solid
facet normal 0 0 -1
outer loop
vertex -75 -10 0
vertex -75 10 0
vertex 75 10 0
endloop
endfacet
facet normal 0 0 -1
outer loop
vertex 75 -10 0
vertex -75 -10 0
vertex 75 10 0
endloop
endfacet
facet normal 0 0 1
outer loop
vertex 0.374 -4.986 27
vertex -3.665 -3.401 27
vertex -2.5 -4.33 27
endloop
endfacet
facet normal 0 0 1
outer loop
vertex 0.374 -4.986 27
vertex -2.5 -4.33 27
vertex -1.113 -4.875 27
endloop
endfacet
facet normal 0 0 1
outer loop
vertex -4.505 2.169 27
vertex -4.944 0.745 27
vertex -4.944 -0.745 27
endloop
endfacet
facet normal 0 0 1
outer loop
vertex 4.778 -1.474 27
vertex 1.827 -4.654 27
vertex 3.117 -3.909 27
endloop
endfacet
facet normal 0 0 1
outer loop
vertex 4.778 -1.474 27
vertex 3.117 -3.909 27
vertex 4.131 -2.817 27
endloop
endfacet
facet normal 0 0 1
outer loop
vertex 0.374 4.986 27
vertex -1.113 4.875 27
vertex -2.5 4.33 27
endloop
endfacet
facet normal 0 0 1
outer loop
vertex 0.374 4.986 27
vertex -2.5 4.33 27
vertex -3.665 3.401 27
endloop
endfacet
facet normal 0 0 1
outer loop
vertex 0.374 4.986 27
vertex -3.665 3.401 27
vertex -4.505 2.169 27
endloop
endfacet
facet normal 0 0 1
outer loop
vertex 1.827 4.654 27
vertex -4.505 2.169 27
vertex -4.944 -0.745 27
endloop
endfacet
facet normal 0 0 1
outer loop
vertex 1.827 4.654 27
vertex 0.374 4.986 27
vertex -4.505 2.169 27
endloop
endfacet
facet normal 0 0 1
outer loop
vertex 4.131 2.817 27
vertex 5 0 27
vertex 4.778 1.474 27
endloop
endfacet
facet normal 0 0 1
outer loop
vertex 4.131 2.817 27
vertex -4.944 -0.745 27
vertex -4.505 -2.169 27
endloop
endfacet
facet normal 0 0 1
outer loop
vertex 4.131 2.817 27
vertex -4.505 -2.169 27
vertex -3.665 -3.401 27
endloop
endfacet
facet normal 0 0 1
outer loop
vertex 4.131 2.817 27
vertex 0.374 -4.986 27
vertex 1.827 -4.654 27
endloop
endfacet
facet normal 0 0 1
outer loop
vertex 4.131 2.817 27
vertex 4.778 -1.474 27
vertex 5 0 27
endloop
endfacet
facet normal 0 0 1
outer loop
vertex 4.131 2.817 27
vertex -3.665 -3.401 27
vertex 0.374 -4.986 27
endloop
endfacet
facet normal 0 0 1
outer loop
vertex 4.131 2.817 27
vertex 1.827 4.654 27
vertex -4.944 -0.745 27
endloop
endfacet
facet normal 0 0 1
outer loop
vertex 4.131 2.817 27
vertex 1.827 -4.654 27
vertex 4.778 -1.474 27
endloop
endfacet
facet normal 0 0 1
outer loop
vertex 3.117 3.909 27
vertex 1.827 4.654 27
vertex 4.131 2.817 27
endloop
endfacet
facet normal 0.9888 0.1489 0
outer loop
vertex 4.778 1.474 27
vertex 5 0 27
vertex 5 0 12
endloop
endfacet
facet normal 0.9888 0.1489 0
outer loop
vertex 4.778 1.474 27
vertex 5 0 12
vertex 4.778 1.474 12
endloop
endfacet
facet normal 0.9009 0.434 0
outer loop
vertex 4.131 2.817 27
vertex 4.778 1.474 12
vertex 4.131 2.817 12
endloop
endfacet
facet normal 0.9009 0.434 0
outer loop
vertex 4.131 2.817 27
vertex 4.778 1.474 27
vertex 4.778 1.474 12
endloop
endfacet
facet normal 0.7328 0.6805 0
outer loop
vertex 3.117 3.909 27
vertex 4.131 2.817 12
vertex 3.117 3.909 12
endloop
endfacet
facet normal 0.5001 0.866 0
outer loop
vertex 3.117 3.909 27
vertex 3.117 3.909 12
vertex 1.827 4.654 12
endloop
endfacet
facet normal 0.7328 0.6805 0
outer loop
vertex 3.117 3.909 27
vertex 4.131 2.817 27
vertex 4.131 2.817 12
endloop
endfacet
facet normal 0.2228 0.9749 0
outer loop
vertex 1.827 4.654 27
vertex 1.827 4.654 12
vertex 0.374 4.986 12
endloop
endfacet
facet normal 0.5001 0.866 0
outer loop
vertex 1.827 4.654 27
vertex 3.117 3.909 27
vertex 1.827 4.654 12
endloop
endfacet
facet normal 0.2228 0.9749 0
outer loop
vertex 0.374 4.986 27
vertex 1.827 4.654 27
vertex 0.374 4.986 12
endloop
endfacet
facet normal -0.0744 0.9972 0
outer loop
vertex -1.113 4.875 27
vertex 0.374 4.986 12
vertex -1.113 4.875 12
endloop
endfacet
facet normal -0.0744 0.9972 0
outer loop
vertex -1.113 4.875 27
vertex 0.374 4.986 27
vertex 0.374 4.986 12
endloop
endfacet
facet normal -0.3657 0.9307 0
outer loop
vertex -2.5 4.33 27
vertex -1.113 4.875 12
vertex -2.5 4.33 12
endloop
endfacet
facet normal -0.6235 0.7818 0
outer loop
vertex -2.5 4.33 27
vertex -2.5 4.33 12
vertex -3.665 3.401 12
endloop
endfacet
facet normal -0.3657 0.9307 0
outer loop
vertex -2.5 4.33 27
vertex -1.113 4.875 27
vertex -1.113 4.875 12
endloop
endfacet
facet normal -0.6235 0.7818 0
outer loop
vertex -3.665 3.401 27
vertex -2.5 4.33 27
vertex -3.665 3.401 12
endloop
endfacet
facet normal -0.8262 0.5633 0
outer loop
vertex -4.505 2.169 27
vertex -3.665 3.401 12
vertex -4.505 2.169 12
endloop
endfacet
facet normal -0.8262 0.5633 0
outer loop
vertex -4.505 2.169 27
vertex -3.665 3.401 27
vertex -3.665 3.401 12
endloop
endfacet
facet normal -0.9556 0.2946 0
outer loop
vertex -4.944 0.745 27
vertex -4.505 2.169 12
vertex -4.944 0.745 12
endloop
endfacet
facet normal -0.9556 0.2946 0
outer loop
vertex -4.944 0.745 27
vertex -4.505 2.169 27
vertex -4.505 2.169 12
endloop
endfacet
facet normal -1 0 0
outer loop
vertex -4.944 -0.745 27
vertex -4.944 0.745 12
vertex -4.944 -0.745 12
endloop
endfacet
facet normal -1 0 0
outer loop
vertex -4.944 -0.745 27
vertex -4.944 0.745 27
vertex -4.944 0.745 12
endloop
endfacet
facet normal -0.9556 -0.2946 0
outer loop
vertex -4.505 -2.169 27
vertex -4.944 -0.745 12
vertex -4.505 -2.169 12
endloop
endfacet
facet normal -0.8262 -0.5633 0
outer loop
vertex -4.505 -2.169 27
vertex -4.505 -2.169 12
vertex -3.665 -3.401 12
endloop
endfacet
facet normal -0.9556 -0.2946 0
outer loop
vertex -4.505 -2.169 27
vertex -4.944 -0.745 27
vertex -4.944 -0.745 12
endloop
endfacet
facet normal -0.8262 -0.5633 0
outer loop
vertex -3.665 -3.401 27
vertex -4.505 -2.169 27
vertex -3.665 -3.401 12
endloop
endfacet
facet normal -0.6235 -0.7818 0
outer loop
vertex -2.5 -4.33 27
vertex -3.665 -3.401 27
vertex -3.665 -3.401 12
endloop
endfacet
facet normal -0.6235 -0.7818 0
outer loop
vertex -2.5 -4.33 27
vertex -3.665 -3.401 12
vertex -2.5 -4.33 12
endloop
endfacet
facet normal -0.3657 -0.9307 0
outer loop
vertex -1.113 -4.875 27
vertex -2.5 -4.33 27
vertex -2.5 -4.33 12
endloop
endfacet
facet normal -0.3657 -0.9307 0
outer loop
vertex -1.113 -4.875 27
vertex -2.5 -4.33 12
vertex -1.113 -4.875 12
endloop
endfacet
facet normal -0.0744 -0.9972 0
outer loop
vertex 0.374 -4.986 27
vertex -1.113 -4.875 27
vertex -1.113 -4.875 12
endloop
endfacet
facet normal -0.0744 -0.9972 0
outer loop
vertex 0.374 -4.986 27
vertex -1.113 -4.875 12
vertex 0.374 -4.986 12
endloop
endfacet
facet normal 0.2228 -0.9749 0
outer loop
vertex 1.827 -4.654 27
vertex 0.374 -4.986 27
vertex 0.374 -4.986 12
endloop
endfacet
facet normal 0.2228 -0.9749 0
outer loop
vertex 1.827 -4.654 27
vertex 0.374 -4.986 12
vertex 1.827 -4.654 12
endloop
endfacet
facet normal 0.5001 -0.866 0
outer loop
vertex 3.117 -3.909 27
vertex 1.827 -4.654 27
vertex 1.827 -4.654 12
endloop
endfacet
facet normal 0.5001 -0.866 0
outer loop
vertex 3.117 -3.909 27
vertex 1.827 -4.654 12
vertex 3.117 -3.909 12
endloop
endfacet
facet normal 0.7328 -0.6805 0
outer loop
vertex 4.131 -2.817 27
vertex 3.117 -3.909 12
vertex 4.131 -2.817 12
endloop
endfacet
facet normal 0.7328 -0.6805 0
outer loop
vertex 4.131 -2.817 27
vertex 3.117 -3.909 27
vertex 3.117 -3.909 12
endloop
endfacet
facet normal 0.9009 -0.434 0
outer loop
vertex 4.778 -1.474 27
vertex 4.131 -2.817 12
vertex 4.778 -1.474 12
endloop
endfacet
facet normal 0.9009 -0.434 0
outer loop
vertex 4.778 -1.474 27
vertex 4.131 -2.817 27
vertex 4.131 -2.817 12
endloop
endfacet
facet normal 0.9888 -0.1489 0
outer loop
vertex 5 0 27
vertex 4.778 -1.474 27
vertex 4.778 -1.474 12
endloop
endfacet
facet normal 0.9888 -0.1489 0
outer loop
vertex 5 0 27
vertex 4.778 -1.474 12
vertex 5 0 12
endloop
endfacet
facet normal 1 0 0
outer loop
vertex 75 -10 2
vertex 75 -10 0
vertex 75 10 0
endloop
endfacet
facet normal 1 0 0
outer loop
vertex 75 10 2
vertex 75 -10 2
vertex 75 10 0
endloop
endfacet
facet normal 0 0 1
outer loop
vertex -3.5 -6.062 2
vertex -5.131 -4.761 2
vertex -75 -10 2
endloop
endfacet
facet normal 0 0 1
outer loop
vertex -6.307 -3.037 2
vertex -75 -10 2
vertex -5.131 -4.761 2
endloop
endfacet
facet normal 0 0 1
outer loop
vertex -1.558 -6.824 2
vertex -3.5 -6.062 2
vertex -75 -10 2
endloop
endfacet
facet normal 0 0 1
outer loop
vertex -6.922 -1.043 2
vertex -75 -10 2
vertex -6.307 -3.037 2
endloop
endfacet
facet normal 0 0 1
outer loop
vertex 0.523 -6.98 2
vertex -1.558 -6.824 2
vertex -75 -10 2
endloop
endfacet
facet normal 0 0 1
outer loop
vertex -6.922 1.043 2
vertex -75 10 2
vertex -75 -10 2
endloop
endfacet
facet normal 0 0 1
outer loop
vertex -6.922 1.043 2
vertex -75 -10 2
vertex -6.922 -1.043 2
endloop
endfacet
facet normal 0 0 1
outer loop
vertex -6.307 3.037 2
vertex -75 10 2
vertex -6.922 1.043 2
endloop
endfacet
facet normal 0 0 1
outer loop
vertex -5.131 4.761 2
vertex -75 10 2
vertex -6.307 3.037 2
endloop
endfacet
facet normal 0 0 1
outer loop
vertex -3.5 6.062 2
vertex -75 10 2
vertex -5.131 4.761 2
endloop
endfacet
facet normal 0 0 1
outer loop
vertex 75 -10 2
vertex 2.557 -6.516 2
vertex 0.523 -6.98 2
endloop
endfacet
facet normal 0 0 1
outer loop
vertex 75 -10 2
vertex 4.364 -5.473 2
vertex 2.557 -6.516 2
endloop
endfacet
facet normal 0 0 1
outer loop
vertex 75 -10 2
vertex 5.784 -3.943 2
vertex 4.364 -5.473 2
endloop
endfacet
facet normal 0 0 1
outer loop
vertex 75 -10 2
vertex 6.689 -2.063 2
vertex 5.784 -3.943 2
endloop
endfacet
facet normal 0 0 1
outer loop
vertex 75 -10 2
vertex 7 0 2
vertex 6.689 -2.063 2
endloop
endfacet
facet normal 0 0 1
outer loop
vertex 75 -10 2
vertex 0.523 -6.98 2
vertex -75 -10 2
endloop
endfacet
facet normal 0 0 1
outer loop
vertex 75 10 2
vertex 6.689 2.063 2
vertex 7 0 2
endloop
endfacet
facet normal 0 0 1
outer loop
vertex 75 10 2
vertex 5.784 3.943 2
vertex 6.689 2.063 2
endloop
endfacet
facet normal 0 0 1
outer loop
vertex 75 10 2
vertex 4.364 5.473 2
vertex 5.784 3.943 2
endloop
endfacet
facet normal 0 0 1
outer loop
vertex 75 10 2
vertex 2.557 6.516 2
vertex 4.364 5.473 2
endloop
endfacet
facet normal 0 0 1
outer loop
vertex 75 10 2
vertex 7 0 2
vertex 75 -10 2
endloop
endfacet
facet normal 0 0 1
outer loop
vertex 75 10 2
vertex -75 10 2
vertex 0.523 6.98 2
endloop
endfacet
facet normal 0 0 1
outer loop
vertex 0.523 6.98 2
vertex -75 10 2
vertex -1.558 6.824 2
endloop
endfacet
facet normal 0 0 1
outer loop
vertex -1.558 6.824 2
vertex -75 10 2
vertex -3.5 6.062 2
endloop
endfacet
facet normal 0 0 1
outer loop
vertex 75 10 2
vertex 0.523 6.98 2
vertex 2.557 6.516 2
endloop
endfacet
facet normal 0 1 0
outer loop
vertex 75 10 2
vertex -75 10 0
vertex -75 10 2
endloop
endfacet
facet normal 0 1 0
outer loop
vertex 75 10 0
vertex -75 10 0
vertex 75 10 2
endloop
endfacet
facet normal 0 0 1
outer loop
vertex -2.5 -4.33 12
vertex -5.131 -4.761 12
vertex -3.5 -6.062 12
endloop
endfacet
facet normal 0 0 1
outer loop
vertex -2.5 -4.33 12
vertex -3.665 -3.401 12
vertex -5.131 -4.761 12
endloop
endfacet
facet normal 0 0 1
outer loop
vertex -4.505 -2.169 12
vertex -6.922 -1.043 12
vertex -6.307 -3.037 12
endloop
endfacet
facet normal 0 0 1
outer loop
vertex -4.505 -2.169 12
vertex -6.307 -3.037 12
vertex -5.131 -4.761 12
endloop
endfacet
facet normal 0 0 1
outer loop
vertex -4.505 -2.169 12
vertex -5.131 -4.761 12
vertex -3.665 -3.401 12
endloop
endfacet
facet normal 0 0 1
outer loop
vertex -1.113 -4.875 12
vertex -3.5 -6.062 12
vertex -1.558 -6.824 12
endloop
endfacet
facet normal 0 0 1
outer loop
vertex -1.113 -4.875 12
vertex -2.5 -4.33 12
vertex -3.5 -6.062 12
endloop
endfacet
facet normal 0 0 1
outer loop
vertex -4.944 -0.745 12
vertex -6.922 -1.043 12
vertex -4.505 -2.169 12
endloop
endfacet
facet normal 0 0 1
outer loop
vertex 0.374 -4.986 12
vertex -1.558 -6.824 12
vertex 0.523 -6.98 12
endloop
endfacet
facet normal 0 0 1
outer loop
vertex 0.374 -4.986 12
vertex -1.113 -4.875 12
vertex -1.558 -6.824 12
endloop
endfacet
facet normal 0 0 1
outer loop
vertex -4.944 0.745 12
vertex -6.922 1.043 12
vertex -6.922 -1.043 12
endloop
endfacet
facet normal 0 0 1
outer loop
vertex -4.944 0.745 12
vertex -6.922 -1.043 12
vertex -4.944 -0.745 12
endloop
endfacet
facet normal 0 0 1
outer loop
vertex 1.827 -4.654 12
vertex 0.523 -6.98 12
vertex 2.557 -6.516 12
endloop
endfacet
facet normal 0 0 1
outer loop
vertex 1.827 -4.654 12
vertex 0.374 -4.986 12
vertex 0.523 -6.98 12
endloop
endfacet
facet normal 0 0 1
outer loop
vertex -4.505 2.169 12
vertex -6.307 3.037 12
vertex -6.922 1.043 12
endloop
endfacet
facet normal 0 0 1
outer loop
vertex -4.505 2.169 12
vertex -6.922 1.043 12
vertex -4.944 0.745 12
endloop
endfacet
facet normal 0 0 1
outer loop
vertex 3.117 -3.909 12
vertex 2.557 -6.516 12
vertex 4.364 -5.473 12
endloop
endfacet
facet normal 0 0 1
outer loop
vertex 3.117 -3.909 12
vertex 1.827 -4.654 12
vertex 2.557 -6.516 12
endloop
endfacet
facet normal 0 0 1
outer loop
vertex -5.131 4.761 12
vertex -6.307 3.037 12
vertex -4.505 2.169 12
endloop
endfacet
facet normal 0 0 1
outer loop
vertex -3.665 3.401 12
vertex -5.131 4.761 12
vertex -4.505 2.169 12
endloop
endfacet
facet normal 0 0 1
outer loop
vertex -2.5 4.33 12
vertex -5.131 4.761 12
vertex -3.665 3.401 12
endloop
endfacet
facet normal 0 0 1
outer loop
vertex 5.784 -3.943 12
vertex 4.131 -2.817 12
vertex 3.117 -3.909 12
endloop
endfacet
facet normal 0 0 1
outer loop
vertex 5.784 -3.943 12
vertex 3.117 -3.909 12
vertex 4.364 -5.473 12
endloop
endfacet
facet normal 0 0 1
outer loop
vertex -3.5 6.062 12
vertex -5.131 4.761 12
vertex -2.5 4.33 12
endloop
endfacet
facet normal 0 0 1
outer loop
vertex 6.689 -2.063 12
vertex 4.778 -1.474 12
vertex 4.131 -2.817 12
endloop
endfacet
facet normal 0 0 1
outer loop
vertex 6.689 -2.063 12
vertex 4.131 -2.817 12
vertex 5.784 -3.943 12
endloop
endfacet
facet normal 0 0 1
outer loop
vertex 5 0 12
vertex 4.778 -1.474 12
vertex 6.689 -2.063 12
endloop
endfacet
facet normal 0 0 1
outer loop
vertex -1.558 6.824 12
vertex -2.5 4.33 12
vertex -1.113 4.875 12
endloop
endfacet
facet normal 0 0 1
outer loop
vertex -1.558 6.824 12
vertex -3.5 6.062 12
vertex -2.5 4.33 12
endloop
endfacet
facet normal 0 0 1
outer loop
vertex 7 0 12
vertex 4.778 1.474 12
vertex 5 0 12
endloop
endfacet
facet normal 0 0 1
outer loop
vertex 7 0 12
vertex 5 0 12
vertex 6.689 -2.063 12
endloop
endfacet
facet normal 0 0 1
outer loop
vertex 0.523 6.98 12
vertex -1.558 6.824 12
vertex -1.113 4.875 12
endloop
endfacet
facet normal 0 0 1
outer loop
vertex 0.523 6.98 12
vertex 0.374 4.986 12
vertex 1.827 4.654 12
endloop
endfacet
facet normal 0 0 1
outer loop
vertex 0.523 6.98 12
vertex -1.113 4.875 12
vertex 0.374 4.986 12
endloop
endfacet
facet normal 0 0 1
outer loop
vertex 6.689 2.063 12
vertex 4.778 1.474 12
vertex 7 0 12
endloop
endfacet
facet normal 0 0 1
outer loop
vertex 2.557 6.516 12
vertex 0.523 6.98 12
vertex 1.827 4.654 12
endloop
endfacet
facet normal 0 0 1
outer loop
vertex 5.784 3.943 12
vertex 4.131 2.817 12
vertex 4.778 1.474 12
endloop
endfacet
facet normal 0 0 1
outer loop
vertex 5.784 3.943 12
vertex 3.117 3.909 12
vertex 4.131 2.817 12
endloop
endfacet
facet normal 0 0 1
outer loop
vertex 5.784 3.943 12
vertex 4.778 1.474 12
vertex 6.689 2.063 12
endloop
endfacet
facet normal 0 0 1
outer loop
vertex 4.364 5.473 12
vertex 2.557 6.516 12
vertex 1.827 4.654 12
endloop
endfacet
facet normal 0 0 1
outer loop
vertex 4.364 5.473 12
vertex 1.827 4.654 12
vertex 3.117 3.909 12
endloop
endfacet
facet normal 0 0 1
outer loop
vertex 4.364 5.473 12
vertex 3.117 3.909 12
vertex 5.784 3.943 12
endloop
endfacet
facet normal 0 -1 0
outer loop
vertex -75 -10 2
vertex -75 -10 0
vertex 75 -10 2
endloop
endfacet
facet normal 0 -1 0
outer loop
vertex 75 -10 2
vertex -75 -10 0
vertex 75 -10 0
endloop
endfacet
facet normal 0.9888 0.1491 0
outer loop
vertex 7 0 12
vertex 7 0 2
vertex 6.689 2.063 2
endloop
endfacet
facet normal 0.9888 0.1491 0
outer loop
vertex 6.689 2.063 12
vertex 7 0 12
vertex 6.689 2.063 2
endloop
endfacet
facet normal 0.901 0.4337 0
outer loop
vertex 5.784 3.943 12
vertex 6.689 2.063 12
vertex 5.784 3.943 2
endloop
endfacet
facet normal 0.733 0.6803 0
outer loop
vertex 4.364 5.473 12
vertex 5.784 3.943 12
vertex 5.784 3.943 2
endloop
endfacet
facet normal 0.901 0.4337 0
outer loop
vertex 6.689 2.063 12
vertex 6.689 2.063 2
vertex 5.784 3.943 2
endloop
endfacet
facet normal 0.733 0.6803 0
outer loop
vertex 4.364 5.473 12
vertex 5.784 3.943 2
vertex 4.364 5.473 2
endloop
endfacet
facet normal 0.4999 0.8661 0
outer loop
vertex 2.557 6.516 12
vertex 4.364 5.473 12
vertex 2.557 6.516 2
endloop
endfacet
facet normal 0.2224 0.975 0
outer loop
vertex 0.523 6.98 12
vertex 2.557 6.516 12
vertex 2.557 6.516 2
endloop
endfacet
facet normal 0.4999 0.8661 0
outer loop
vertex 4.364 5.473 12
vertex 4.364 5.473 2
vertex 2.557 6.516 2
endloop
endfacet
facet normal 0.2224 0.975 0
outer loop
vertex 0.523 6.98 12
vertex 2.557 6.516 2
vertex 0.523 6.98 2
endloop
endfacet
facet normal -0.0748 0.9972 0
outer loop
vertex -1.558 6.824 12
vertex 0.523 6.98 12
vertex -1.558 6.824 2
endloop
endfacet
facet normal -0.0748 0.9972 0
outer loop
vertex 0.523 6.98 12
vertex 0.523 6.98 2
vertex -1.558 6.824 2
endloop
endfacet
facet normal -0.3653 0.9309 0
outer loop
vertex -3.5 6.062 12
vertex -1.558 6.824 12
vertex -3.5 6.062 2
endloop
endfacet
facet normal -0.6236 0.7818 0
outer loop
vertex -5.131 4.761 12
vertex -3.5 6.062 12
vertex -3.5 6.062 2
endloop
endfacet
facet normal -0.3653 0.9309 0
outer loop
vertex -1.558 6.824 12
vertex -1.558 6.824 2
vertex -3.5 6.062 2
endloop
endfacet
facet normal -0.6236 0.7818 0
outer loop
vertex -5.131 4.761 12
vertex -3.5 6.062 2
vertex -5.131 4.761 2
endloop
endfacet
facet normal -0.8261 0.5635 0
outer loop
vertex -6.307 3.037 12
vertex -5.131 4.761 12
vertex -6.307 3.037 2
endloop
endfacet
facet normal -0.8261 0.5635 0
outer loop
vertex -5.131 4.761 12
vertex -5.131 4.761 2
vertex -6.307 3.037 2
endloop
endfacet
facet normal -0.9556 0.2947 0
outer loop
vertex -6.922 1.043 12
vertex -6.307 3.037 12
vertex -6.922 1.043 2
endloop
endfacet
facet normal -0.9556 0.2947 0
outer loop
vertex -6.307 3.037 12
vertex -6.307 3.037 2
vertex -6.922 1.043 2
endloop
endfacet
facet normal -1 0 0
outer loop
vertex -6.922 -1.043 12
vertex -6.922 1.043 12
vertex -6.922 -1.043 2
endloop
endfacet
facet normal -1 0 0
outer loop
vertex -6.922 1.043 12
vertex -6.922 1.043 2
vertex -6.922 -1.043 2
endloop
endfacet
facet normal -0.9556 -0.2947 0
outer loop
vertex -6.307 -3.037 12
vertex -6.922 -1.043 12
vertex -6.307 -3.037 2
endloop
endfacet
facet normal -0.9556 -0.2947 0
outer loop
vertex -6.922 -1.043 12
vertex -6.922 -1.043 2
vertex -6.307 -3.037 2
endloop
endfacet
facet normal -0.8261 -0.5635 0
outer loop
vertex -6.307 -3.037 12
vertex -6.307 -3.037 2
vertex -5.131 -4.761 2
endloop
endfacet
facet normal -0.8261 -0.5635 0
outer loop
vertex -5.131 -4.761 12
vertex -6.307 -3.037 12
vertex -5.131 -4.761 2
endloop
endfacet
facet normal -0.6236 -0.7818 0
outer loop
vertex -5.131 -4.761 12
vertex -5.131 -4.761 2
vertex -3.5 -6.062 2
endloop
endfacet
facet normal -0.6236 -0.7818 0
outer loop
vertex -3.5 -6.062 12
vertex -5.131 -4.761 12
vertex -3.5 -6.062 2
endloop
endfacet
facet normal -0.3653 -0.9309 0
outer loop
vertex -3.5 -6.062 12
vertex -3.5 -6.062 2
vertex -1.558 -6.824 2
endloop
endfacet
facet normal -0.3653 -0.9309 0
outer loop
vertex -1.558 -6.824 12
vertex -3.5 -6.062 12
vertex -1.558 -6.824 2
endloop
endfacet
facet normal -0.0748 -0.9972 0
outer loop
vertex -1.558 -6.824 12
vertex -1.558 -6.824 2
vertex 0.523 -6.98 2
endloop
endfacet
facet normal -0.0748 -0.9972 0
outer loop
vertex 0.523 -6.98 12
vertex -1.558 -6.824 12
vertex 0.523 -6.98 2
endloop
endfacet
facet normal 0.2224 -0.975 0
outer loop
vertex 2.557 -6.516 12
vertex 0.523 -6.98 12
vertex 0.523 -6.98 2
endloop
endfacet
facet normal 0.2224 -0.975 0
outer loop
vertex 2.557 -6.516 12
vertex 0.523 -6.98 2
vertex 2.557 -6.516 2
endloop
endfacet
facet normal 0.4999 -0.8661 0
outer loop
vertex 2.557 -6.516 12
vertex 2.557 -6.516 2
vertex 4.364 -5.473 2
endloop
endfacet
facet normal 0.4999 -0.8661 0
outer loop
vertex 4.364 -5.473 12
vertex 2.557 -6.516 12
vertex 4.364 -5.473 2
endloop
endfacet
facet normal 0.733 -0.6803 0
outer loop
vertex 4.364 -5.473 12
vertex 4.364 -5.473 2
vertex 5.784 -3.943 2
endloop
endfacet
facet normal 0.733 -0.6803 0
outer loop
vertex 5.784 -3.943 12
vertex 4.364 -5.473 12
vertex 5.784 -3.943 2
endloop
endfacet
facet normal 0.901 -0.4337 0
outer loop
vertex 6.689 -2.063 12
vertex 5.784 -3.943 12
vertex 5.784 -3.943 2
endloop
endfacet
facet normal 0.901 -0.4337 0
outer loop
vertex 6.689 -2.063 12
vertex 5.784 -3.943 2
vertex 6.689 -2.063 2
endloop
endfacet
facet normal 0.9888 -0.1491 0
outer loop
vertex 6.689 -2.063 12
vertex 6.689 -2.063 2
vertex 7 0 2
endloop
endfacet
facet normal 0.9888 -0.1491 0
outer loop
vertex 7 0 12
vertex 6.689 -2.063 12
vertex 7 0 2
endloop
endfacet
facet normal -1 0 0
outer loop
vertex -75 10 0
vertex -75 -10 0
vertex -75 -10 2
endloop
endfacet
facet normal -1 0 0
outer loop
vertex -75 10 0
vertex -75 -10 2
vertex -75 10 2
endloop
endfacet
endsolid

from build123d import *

# Parameters (mm, degrees)
F0_W     = 150
F0_H     = 20
F1_DEPTH = 2
F2_R     = 7
F3_DEPTH = 25
F4_R     = 7
F4_R_2   = 5
F5_DEPTH = 15


with BuildPart() as f1:
    # F0 (on Top) → F1 (new body)
    with BuildSketch(Plane.XY):
        Rectangle(F0_W, F0_H)
    extrude(amount=F1_DEPTH)

    # F2 (on face) → F3 (join)
    with BuildSketch(Plane.XY.offset(2)):
        Circle(F2_R)
    extrude(amount=F3_DEPTH)

    # F4 (on face) → F5 (cut)
    with BuildSketch(Plane.XY.offset(27)):
        Circle(F4_R)
        Circle(F4_R_2, mode=Mode.SUBTRACT)
    extrude(amount=-F5_DEPTH, mode=Mode.SUBTRACT)


solid = f1.part
